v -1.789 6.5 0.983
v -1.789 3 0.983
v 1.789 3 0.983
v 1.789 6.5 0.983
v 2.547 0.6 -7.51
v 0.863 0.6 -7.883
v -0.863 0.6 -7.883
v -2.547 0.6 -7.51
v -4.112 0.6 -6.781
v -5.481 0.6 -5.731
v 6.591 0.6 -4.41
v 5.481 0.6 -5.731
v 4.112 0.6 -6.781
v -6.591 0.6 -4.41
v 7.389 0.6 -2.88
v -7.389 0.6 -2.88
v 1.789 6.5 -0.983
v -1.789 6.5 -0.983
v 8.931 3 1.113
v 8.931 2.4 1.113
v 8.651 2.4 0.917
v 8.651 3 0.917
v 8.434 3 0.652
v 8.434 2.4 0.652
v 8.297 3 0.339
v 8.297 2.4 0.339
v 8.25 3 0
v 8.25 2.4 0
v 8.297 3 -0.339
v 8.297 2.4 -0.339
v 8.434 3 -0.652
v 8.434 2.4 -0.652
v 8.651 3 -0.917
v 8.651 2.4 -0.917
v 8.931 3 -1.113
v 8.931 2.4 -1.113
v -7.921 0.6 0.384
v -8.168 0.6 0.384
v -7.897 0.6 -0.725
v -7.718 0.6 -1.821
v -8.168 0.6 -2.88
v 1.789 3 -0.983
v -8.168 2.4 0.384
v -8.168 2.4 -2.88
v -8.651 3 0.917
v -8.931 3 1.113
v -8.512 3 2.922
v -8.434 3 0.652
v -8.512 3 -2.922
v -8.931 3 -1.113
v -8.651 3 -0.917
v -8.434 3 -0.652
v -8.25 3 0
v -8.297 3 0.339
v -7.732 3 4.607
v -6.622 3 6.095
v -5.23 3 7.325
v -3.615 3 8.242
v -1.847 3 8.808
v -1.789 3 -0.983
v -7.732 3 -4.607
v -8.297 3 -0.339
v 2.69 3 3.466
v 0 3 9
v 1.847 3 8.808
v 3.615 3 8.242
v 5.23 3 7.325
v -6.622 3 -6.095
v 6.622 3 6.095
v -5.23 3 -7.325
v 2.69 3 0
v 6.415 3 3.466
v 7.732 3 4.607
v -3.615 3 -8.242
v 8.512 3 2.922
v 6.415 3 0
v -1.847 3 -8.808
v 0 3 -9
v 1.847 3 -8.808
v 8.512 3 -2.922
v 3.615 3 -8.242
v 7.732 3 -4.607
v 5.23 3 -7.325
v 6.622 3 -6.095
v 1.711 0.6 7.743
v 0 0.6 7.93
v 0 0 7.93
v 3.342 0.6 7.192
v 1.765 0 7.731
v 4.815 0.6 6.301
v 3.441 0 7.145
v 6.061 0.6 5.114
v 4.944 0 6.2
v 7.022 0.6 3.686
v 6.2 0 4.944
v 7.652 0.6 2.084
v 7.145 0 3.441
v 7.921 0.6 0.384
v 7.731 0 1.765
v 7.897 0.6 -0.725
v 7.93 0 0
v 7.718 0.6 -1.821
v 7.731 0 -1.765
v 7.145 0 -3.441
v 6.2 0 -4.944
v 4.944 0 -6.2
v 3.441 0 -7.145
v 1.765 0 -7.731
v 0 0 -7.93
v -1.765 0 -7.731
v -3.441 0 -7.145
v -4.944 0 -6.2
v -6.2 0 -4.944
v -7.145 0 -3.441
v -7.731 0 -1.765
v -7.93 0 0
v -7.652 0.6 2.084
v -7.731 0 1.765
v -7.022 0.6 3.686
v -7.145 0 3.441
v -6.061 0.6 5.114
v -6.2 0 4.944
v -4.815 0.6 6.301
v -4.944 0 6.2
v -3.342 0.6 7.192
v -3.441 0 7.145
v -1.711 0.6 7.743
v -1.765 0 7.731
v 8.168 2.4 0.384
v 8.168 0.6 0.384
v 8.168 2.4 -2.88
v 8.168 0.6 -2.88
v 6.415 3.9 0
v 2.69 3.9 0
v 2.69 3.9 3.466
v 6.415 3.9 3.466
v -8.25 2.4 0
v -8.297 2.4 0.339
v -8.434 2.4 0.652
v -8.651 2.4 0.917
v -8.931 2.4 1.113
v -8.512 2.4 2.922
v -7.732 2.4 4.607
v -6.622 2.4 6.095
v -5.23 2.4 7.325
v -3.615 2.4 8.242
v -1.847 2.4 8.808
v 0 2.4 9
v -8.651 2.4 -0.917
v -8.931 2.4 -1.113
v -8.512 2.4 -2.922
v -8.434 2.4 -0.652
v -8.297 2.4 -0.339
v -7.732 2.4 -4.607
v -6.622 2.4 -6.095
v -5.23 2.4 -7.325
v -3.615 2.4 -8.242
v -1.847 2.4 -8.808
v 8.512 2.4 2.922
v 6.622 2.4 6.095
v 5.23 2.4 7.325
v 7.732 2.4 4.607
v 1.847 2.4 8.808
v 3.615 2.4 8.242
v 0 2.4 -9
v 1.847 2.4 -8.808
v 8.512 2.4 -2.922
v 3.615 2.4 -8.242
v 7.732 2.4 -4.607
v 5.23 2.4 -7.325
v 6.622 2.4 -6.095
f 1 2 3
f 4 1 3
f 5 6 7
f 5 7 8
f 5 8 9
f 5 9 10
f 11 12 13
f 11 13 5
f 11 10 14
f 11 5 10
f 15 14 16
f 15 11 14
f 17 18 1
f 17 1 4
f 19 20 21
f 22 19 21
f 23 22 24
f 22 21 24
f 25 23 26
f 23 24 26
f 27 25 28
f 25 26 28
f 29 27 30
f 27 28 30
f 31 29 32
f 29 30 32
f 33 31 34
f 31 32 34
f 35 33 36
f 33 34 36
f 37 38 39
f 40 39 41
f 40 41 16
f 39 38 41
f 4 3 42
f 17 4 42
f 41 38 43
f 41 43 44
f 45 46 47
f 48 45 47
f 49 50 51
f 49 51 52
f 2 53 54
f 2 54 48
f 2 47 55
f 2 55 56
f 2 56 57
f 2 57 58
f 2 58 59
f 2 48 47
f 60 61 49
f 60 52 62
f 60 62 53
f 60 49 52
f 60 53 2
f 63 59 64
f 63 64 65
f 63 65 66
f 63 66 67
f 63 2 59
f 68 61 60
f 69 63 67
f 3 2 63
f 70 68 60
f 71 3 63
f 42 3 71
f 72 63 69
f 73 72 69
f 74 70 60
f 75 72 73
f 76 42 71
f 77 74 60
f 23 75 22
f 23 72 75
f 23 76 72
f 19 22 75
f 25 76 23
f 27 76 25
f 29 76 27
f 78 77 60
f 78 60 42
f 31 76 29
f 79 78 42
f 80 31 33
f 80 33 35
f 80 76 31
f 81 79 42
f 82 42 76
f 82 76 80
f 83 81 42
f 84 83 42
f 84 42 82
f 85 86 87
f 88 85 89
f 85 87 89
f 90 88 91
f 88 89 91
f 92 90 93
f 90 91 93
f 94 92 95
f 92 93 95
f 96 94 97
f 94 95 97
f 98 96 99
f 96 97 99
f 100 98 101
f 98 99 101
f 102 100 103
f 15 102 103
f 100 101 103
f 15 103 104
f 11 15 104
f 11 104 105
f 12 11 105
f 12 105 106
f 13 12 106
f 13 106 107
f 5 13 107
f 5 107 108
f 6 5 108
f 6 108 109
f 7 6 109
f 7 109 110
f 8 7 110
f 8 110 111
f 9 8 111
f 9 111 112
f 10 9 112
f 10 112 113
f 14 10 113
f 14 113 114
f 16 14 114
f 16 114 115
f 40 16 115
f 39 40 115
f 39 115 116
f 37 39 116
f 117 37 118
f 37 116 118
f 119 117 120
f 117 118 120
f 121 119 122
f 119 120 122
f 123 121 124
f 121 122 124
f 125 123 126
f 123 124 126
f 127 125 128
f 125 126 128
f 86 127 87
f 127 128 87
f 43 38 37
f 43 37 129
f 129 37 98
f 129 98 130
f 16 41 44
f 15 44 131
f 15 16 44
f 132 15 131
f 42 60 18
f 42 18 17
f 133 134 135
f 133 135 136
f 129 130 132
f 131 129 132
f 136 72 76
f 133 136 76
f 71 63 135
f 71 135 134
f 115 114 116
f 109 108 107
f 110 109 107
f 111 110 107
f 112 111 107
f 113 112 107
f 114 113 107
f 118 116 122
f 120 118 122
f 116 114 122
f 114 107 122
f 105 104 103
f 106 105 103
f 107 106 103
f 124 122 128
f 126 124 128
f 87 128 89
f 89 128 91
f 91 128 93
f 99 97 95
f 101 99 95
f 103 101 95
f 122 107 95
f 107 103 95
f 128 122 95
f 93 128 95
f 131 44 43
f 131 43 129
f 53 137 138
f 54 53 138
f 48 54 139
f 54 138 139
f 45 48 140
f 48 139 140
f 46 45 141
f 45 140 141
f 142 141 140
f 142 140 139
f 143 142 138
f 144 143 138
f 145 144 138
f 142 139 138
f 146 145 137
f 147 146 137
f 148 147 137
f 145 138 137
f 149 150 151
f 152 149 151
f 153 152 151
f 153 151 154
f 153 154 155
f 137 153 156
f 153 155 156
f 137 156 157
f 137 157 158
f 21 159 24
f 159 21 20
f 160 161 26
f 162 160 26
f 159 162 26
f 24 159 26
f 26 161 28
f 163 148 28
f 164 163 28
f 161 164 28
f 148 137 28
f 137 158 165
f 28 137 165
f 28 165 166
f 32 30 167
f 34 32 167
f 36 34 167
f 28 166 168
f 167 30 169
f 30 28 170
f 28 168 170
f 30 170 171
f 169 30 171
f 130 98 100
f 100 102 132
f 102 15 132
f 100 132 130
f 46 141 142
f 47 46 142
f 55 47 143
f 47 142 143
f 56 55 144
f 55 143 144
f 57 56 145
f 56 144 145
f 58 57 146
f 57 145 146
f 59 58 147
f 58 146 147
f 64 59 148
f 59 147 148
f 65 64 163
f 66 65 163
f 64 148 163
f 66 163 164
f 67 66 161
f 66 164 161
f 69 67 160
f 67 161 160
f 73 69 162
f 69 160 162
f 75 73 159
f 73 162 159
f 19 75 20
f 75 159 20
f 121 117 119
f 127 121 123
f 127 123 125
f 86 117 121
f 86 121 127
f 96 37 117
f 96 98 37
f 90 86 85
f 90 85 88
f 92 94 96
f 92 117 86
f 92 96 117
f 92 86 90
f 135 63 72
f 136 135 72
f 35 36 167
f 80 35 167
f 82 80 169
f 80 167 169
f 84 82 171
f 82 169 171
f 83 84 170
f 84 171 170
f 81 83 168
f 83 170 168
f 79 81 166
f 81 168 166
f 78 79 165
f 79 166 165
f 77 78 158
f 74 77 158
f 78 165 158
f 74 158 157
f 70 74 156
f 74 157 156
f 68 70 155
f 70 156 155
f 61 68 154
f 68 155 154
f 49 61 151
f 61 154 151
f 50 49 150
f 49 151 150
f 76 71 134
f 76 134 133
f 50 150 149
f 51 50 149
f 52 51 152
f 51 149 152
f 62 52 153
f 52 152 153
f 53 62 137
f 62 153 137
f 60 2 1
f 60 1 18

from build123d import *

# Parameters (mm, degrees)
SKETCH1_R           = 7.93026875
BOSS_EXTRUDE1_DEPTH = 0.6
SKETCH2_W           = 16.335240752
SKETCH2_H           = 3.264094219
BOSS_EXTRUDE2_DEPTH = 1.8
BOSS_EXTRUDE3_DEPTH = 0.6
SKETCH4_W           = 3.724930292
SKETCH4_H           = 3.466254577
BOSS_EXTRUDE4_DEPTH = 0.9
SKETCH5_W           = 3.577115598
SKETCH5_H           = 1.965935432
BOSS_EXTRUDE5_DEPTH = 3.5


with BuildPart() as part:
    # Sketch1 → Boss-Extrude1 (new body)
    with BuildSketch(Plane(origin=(0, 0, 0), x_dir=(1, 0, 0), z_dir=(0, 1, 0))):
        with Locations(Location((0, 0, 0), (0, 0, 270))):
            Circle(SKETCH1_R)
    extrude(amount=BOSS_EXTRUDE1_DEPTH)

    # Sketch2 → Boss-Extrude2 (add)
    with BuildSketch(Plane(origin=(0, 0.6, 0), x_dir=(1, 0, 0), z_dir=(0, 1, 0))):
        with Locations((0, 1.248036025)):
            Rectangle(SKETCH2_W, SKETCH2_H)
    extrude(amount=BOSS_EXTRUDE2_DEPTH)


with BuildPart() as body_2:
    # Sketch3 → Boss-Extrude3 (new body)
    with BuildSketch(Plane(origin=(0, 2.4, 0), x_dir=(1, 0, 0), z_dir=(0, 1, 0))):
        with BuildLine():
            ThreePointArc((8.930921053, -1.112946158), (8.25, 0), (8.930921053, 1.112946158))
            ThreePointArc((8.930921053, 1.112946158), (0, 9), (-8.930921053, 1.112946158))
            ThreePointArc((-8.930921053, 1.112946158), (-8.433733456, 0.652361601), (-8.25, 0))
            ThreePointArc((-8.25, 0), (-8.433733456, -0.652361601), (-8.930921053, -1.112946158))
            ThreePointArc((-8.930921053, -1.112946158), (0, -9), (8.930921053, -1.112946158))
        make_face()
    extrude(amount=BOSS_EXTRUDE3_DEPTH)

    # Sketch4 → Boss-Extrude4 (add)
    with BuildSketch(Plane(origin=(0, 3, 0), x_dir=(1, 0, 0), z_dir=(0, 1, 0))):
        with Locations((4.552692579, -1.733127289)):
            Rectangle(SKETCH4_W, SKETCH4_H)
    extrude(amount=BOSS_EXTRUDE4_DEPTH)

    # Sketch5 → Boss-Extrude5 (add)
    with BuildSketch(Plane(origin=(0, 3, 0), x_dir=(1, 0, 0), z_dir=(0, 1, 0))):
        Rectangle(SKETCH5_W, SKETCH5_H)
    extrude(amount=BOSS_EXTRUDE5_DEPTH)


solid = Compound([part.part, body_2.part])
